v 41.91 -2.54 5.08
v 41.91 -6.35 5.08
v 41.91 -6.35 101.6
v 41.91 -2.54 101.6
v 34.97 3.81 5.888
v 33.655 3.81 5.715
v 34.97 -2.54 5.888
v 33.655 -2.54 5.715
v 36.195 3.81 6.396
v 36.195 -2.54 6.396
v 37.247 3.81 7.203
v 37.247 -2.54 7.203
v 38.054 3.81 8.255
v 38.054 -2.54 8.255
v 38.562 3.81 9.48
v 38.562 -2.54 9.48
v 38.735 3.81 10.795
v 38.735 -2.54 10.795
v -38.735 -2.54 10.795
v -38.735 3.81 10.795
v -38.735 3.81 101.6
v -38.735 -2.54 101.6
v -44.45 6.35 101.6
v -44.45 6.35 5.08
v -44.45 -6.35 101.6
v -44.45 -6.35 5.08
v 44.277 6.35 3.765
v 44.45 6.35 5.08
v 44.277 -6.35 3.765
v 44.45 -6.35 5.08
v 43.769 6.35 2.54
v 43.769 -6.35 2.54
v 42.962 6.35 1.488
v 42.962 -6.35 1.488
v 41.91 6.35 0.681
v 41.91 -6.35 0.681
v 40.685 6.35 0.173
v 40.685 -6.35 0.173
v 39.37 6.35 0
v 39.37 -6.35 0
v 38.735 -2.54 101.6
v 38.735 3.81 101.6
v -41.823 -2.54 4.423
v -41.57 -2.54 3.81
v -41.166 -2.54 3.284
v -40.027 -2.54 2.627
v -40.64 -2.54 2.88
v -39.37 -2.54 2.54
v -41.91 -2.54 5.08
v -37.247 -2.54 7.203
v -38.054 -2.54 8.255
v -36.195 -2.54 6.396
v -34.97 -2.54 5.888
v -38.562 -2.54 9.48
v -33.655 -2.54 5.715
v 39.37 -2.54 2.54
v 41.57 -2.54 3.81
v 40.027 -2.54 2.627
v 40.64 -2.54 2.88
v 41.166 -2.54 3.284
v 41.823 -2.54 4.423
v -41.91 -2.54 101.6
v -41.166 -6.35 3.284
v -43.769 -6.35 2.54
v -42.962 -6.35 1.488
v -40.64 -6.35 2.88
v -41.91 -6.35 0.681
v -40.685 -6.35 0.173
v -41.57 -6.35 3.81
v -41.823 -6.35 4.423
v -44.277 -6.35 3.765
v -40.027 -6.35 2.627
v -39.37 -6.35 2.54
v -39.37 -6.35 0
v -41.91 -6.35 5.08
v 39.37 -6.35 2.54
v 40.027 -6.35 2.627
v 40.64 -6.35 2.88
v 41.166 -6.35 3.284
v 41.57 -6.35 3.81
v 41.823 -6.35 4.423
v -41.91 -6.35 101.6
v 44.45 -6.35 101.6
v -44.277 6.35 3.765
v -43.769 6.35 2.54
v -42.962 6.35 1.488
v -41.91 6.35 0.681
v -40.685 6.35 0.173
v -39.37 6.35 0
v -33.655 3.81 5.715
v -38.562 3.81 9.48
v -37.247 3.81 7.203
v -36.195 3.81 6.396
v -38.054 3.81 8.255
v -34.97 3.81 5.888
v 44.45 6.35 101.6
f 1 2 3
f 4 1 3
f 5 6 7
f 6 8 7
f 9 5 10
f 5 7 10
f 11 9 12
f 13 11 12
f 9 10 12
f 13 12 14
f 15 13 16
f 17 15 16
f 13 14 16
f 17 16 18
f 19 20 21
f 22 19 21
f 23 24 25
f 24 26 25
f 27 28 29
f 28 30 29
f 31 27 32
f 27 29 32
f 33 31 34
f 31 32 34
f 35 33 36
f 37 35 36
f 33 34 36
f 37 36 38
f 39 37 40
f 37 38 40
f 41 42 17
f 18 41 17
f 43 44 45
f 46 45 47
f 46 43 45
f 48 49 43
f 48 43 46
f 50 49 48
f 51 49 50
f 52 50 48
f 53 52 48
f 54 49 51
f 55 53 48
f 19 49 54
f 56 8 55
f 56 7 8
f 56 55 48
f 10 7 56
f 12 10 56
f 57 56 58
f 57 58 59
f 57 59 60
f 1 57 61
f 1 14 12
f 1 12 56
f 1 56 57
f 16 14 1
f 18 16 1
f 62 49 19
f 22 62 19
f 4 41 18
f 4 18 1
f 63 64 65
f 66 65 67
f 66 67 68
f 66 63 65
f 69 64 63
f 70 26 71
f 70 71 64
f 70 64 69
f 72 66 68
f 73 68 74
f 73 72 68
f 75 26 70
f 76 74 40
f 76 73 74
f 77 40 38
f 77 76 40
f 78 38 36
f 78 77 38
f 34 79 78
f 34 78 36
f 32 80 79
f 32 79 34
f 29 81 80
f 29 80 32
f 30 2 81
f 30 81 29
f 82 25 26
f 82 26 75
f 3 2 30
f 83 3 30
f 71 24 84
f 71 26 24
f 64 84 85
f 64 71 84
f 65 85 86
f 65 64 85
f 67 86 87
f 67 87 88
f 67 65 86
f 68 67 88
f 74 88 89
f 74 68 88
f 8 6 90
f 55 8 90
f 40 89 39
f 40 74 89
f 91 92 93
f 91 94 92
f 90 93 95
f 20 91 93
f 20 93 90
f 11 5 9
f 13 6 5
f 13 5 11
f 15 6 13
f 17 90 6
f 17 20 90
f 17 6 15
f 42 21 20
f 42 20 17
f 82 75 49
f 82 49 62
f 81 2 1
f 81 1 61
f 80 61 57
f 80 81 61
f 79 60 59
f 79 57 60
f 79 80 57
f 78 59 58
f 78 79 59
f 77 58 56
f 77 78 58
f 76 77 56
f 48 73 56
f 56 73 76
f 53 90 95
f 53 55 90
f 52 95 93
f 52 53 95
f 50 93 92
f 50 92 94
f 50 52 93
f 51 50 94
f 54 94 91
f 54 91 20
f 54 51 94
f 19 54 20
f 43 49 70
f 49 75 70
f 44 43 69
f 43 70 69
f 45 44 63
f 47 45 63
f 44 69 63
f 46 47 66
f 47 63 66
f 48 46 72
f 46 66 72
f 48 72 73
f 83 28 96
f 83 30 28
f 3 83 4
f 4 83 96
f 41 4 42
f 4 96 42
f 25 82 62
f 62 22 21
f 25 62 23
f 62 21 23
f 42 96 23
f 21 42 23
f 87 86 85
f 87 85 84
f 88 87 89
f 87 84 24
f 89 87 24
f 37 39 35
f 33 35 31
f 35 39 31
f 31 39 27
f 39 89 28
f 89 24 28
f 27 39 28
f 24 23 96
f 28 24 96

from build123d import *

# Parameters (mm, degrees)
F0_W     = 88.9
F0_H     = 101.6
F1_DEPTH = 6.35
F2_R     = 5.08
F3_T     = -2.54
F4_W     = 83.82
F4_H     = 2.54
F5_DEPTH = 10.16
F7_DEPTH = 6.35
F8_R     = 5.08


with BuildPart() as f1:
    # F0 (on Front) → F1 (new body, symmetric)
    with BuildSketch(Plane.XZ):
        with Locations((0, 50.8)):
            Rectangle(F0_W, F0_H)
    extrude(amount=F1_DEPTH, both=True)

    # F2
    f2_edges = [f1.edges().sort_by_distance(p)[0] for p in [
        (-44.45, 0, 0),
        (44.45, 0, 0),
    ]]
    fillet(f2_edges, radius=F2_R)

    # F3
    f3_openings = [f1.faces().sort_by_distance(p)[0] for p in [
        (0, -6.35, 50.860979),
    ]]
    offset(amount=F3_T, openings=f3_openings)

    # F4 (on face) → F5 (cut, through all)
    with BuildSketch(Plane.XZ.offset(6.35)):
        with Locations((0, 100.33)):
            Rectangle(F4_W, F4_H)
    extrude(amount=-F5_DEPTH, mode=Mode.SUBTRACT)

    # F6 (on face) → F7 (join)
    with BuildSketch(Plane.XZ.offset(-3.81)):
        with BuildLine():
            Line((38.735, 5.715), (-38.735, 5.715))
            Line((-38.735, 5.715), (-38.735, 101.6))
            Line((-38.735, 101.6), (-41.91, 101.6))
            Line((-41.91, 101.6), (-41.91, 5.08))
            ThreePointArc((-41.91, 5.08), (-41.1660512242, 3.2839487758), (-39.37, 2.54))
            Line((-39.37, 2.54), (39.37, 2.54))
            ThreePointArc((39.37, 2.54), (41.1660512242, 3.2839487758), (41.91, 5.08))
            Line((41.91, 5.08), (41.91, 101.6))
            Line((41.91, 101.6), (38.735, 101.6))
            Line((38.735, 101.6), (38.735, 5.715))
        make_face()
    extrude(amount=F7_DEPTH)

    # F8
    f8_edges = [f1.edges().sort_by_distance(p)[0] for p in [
        (-38.735, 0.635, 5.715),
        (38.735, 0.635, 5.715),
    ]]
    fillet(f8_edges, radius=F8_R)


solid = f1.part
